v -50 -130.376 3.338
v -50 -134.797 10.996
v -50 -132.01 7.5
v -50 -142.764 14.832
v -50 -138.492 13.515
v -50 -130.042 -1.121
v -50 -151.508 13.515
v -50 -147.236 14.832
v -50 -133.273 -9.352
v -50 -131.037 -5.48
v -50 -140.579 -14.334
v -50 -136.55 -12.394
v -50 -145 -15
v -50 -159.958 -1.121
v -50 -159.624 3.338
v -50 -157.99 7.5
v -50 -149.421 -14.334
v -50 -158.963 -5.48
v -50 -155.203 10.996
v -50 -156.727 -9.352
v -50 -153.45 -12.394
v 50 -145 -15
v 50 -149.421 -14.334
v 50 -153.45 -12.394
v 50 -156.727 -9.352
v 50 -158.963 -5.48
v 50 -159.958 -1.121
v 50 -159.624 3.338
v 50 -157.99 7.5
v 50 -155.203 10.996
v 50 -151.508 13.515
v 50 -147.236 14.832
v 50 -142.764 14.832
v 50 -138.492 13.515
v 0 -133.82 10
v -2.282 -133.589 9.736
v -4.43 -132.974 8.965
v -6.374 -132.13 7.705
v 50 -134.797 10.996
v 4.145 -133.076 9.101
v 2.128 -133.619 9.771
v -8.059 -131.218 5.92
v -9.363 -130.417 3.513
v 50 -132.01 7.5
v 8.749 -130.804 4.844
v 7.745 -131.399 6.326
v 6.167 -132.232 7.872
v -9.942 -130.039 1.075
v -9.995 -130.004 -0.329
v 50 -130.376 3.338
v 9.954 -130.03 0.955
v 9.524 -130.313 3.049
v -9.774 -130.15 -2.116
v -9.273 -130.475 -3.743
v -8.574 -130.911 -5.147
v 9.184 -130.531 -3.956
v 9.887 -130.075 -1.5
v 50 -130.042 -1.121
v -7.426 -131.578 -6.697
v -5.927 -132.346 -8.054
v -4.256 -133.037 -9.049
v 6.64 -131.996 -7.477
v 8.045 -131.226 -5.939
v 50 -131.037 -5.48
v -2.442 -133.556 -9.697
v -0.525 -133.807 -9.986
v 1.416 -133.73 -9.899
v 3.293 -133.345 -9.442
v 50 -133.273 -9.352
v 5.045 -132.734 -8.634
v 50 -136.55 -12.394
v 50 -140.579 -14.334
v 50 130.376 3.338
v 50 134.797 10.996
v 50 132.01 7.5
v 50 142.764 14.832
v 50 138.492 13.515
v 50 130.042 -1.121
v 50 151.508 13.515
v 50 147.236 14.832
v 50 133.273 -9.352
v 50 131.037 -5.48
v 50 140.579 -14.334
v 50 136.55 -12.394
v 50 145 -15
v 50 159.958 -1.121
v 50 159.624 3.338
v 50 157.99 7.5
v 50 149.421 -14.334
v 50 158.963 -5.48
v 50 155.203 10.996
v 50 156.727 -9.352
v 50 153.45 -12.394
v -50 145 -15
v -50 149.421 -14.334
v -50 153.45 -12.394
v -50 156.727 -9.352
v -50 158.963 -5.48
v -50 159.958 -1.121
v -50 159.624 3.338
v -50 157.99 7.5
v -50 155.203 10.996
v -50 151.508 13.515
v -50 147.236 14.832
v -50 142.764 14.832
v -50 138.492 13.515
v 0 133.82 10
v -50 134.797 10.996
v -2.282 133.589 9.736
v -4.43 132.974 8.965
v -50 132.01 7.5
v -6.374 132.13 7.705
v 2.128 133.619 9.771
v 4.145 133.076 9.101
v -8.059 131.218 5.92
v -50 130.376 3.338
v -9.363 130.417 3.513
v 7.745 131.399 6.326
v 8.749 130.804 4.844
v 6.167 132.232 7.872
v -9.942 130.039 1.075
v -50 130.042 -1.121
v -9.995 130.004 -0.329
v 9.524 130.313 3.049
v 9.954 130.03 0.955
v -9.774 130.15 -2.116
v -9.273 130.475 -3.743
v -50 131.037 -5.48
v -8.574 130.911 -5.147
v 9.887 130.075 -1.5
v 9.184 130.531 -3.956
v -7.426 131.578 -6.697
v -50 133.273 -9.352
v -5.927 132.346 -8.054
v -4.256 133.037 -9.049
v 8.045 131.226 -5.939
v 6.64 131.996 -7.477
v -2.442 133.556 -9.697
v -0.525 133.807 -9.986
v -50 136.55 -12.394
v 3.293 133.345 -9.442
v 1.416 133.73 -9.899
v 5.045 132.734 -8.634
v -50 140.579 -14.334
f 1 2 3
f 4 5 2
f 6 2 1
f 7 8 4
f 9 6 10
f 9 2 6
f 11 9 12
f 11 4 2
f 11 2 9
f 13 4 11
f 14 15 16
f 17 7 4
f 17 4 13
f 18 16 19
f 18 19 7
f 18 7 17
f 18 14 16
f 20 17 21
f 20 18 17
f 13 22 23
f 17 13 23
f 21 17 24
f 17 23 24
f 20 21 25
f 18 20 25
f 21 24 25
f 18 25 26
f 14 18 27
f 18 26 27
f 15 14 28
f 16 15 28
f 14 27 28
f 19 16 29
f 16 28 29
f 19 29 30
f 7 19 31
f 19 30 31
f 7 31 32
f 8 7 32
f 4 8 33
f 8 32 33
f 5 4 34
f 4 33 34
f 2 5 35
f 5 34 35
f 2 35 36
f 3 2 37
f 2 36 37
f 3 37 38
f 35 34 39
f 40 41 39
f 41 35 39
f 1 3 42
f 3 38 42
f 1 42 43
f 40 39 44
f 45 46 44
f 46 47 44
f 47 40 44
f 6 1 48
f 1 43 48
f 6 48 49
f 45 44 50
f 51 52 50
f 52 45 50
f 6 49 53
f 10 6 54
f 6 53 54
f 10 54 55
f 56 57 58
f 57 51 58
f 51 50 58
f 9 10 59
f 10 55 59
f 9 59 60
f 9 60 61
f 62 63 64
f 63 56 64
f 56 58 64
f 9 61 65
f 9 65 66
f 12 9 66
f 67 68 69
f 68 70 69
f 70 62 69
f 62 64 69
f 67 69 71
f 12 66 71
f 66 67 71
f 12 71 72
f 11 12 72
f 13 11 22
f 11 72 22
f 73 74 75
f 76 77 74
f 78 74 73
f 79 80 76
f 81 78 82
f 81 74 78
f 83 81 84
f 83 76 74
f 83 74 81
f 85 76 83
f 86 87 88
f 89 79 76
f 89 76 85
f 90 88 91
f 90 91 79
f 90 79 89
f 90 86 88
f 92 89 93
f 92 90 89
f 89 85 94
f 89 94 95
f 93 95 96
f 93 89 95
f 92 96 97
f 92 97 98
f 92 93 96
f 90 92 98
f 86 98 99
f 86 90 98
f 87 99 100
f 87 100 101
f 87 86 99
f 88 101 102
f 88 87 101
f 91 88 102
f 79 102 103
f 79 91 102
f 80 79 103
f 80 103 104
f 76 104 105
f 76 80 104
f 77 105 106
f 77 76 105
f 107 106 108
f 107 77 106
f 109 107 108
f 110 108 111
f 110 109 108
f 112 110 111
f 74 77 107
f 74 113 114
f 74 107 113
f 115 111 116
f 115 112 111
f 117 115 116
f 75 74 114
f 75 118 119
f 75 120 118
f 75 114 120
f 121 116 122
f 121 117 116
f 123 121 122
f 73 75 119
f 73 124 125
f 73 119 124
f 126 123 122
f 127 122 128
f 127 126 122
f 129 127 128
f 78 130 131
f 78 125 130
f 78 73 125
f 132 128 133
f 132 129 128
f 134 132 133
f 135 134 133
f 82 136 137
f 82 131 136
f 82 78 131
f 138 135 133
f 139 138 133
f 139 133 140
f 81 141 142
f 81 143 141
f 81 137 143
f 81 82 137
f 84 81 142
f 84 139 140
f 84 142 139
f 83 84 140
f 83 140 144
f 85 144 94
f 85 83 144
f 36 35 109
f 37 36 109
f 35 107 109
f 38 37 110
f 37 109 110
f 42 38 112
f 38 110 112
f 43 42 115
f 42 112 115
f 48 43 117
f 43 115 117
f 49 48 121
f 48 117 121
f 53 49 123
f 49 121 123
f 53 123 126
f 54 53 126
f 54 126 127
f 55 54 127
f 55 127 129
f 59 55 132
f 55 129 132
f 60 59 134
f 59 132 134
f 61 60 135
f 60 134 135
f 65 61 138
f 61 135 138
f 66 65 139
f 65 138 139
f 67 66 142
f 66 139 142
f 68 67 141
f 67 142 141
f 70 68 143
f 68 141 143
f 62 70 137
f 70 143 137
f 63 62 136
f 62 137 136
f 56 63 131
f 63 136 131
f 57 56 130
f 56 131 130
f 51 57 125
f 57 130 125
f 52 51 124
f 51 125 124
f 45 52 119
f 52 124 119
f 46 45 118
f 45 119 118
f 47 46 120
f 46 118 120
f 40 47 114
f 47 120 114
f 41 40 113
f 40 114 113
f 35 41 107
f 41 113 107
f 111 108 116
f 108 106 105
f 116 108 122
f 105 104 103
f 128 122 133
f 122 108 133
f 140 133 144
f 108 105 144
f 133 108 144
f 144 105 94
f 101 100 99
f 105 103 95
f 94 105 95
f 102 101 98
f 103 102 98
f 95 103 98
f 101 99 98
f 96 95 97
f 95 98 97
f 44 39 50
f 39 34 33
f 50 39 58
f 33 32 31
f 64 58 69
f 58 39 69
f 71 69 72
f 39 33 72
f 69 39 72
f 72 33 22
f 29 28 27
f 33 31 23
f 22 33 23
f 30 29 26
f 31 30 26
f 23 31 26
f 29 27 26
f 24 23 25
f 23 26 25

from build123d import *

# Parameters (mm, degrees)
SKETCH1_W           = 10
SKETCH1_H           = 290
SKETCH2_R           = 15
BOSS_EXTRUDE1_DEPTH = 50


with BuildPart() as part:
    # Sketch1 → Revolve1 (revolve)
    with BuildSketch(Plane.XY, mode=Mode.PRIVATE) as revolve1_sk:
        with Locations((-5, 0)):
            Rectangle(SKETCH1_W, SKETCH1_H)
    revolve(revolve1_sk.sketch.rotate(Axis((0, 145, 0), (0, -1, 0)), 270), axis=Axis((0, 145, 0), (0, -1, 0)))

    # Sketch2 → Boss-Extrude1 (add, symmetric)
    with BuildSketch(Plane(origin=(0, 0, 0), x_dir=(0, 0, -1), z_dir=(1, 0, 0))):
        with Locations((0, 145)):
            Circle(SKETCH2_R)
    boss_extrude1 = extrude(amount=BOSS_EXTRUDE1_DEPTH, both=True)

    # Mirror1: Boss-Extrude1 across plane
    add(boss_extrude1.mirror(Plane.ZX))


solid = part.part
